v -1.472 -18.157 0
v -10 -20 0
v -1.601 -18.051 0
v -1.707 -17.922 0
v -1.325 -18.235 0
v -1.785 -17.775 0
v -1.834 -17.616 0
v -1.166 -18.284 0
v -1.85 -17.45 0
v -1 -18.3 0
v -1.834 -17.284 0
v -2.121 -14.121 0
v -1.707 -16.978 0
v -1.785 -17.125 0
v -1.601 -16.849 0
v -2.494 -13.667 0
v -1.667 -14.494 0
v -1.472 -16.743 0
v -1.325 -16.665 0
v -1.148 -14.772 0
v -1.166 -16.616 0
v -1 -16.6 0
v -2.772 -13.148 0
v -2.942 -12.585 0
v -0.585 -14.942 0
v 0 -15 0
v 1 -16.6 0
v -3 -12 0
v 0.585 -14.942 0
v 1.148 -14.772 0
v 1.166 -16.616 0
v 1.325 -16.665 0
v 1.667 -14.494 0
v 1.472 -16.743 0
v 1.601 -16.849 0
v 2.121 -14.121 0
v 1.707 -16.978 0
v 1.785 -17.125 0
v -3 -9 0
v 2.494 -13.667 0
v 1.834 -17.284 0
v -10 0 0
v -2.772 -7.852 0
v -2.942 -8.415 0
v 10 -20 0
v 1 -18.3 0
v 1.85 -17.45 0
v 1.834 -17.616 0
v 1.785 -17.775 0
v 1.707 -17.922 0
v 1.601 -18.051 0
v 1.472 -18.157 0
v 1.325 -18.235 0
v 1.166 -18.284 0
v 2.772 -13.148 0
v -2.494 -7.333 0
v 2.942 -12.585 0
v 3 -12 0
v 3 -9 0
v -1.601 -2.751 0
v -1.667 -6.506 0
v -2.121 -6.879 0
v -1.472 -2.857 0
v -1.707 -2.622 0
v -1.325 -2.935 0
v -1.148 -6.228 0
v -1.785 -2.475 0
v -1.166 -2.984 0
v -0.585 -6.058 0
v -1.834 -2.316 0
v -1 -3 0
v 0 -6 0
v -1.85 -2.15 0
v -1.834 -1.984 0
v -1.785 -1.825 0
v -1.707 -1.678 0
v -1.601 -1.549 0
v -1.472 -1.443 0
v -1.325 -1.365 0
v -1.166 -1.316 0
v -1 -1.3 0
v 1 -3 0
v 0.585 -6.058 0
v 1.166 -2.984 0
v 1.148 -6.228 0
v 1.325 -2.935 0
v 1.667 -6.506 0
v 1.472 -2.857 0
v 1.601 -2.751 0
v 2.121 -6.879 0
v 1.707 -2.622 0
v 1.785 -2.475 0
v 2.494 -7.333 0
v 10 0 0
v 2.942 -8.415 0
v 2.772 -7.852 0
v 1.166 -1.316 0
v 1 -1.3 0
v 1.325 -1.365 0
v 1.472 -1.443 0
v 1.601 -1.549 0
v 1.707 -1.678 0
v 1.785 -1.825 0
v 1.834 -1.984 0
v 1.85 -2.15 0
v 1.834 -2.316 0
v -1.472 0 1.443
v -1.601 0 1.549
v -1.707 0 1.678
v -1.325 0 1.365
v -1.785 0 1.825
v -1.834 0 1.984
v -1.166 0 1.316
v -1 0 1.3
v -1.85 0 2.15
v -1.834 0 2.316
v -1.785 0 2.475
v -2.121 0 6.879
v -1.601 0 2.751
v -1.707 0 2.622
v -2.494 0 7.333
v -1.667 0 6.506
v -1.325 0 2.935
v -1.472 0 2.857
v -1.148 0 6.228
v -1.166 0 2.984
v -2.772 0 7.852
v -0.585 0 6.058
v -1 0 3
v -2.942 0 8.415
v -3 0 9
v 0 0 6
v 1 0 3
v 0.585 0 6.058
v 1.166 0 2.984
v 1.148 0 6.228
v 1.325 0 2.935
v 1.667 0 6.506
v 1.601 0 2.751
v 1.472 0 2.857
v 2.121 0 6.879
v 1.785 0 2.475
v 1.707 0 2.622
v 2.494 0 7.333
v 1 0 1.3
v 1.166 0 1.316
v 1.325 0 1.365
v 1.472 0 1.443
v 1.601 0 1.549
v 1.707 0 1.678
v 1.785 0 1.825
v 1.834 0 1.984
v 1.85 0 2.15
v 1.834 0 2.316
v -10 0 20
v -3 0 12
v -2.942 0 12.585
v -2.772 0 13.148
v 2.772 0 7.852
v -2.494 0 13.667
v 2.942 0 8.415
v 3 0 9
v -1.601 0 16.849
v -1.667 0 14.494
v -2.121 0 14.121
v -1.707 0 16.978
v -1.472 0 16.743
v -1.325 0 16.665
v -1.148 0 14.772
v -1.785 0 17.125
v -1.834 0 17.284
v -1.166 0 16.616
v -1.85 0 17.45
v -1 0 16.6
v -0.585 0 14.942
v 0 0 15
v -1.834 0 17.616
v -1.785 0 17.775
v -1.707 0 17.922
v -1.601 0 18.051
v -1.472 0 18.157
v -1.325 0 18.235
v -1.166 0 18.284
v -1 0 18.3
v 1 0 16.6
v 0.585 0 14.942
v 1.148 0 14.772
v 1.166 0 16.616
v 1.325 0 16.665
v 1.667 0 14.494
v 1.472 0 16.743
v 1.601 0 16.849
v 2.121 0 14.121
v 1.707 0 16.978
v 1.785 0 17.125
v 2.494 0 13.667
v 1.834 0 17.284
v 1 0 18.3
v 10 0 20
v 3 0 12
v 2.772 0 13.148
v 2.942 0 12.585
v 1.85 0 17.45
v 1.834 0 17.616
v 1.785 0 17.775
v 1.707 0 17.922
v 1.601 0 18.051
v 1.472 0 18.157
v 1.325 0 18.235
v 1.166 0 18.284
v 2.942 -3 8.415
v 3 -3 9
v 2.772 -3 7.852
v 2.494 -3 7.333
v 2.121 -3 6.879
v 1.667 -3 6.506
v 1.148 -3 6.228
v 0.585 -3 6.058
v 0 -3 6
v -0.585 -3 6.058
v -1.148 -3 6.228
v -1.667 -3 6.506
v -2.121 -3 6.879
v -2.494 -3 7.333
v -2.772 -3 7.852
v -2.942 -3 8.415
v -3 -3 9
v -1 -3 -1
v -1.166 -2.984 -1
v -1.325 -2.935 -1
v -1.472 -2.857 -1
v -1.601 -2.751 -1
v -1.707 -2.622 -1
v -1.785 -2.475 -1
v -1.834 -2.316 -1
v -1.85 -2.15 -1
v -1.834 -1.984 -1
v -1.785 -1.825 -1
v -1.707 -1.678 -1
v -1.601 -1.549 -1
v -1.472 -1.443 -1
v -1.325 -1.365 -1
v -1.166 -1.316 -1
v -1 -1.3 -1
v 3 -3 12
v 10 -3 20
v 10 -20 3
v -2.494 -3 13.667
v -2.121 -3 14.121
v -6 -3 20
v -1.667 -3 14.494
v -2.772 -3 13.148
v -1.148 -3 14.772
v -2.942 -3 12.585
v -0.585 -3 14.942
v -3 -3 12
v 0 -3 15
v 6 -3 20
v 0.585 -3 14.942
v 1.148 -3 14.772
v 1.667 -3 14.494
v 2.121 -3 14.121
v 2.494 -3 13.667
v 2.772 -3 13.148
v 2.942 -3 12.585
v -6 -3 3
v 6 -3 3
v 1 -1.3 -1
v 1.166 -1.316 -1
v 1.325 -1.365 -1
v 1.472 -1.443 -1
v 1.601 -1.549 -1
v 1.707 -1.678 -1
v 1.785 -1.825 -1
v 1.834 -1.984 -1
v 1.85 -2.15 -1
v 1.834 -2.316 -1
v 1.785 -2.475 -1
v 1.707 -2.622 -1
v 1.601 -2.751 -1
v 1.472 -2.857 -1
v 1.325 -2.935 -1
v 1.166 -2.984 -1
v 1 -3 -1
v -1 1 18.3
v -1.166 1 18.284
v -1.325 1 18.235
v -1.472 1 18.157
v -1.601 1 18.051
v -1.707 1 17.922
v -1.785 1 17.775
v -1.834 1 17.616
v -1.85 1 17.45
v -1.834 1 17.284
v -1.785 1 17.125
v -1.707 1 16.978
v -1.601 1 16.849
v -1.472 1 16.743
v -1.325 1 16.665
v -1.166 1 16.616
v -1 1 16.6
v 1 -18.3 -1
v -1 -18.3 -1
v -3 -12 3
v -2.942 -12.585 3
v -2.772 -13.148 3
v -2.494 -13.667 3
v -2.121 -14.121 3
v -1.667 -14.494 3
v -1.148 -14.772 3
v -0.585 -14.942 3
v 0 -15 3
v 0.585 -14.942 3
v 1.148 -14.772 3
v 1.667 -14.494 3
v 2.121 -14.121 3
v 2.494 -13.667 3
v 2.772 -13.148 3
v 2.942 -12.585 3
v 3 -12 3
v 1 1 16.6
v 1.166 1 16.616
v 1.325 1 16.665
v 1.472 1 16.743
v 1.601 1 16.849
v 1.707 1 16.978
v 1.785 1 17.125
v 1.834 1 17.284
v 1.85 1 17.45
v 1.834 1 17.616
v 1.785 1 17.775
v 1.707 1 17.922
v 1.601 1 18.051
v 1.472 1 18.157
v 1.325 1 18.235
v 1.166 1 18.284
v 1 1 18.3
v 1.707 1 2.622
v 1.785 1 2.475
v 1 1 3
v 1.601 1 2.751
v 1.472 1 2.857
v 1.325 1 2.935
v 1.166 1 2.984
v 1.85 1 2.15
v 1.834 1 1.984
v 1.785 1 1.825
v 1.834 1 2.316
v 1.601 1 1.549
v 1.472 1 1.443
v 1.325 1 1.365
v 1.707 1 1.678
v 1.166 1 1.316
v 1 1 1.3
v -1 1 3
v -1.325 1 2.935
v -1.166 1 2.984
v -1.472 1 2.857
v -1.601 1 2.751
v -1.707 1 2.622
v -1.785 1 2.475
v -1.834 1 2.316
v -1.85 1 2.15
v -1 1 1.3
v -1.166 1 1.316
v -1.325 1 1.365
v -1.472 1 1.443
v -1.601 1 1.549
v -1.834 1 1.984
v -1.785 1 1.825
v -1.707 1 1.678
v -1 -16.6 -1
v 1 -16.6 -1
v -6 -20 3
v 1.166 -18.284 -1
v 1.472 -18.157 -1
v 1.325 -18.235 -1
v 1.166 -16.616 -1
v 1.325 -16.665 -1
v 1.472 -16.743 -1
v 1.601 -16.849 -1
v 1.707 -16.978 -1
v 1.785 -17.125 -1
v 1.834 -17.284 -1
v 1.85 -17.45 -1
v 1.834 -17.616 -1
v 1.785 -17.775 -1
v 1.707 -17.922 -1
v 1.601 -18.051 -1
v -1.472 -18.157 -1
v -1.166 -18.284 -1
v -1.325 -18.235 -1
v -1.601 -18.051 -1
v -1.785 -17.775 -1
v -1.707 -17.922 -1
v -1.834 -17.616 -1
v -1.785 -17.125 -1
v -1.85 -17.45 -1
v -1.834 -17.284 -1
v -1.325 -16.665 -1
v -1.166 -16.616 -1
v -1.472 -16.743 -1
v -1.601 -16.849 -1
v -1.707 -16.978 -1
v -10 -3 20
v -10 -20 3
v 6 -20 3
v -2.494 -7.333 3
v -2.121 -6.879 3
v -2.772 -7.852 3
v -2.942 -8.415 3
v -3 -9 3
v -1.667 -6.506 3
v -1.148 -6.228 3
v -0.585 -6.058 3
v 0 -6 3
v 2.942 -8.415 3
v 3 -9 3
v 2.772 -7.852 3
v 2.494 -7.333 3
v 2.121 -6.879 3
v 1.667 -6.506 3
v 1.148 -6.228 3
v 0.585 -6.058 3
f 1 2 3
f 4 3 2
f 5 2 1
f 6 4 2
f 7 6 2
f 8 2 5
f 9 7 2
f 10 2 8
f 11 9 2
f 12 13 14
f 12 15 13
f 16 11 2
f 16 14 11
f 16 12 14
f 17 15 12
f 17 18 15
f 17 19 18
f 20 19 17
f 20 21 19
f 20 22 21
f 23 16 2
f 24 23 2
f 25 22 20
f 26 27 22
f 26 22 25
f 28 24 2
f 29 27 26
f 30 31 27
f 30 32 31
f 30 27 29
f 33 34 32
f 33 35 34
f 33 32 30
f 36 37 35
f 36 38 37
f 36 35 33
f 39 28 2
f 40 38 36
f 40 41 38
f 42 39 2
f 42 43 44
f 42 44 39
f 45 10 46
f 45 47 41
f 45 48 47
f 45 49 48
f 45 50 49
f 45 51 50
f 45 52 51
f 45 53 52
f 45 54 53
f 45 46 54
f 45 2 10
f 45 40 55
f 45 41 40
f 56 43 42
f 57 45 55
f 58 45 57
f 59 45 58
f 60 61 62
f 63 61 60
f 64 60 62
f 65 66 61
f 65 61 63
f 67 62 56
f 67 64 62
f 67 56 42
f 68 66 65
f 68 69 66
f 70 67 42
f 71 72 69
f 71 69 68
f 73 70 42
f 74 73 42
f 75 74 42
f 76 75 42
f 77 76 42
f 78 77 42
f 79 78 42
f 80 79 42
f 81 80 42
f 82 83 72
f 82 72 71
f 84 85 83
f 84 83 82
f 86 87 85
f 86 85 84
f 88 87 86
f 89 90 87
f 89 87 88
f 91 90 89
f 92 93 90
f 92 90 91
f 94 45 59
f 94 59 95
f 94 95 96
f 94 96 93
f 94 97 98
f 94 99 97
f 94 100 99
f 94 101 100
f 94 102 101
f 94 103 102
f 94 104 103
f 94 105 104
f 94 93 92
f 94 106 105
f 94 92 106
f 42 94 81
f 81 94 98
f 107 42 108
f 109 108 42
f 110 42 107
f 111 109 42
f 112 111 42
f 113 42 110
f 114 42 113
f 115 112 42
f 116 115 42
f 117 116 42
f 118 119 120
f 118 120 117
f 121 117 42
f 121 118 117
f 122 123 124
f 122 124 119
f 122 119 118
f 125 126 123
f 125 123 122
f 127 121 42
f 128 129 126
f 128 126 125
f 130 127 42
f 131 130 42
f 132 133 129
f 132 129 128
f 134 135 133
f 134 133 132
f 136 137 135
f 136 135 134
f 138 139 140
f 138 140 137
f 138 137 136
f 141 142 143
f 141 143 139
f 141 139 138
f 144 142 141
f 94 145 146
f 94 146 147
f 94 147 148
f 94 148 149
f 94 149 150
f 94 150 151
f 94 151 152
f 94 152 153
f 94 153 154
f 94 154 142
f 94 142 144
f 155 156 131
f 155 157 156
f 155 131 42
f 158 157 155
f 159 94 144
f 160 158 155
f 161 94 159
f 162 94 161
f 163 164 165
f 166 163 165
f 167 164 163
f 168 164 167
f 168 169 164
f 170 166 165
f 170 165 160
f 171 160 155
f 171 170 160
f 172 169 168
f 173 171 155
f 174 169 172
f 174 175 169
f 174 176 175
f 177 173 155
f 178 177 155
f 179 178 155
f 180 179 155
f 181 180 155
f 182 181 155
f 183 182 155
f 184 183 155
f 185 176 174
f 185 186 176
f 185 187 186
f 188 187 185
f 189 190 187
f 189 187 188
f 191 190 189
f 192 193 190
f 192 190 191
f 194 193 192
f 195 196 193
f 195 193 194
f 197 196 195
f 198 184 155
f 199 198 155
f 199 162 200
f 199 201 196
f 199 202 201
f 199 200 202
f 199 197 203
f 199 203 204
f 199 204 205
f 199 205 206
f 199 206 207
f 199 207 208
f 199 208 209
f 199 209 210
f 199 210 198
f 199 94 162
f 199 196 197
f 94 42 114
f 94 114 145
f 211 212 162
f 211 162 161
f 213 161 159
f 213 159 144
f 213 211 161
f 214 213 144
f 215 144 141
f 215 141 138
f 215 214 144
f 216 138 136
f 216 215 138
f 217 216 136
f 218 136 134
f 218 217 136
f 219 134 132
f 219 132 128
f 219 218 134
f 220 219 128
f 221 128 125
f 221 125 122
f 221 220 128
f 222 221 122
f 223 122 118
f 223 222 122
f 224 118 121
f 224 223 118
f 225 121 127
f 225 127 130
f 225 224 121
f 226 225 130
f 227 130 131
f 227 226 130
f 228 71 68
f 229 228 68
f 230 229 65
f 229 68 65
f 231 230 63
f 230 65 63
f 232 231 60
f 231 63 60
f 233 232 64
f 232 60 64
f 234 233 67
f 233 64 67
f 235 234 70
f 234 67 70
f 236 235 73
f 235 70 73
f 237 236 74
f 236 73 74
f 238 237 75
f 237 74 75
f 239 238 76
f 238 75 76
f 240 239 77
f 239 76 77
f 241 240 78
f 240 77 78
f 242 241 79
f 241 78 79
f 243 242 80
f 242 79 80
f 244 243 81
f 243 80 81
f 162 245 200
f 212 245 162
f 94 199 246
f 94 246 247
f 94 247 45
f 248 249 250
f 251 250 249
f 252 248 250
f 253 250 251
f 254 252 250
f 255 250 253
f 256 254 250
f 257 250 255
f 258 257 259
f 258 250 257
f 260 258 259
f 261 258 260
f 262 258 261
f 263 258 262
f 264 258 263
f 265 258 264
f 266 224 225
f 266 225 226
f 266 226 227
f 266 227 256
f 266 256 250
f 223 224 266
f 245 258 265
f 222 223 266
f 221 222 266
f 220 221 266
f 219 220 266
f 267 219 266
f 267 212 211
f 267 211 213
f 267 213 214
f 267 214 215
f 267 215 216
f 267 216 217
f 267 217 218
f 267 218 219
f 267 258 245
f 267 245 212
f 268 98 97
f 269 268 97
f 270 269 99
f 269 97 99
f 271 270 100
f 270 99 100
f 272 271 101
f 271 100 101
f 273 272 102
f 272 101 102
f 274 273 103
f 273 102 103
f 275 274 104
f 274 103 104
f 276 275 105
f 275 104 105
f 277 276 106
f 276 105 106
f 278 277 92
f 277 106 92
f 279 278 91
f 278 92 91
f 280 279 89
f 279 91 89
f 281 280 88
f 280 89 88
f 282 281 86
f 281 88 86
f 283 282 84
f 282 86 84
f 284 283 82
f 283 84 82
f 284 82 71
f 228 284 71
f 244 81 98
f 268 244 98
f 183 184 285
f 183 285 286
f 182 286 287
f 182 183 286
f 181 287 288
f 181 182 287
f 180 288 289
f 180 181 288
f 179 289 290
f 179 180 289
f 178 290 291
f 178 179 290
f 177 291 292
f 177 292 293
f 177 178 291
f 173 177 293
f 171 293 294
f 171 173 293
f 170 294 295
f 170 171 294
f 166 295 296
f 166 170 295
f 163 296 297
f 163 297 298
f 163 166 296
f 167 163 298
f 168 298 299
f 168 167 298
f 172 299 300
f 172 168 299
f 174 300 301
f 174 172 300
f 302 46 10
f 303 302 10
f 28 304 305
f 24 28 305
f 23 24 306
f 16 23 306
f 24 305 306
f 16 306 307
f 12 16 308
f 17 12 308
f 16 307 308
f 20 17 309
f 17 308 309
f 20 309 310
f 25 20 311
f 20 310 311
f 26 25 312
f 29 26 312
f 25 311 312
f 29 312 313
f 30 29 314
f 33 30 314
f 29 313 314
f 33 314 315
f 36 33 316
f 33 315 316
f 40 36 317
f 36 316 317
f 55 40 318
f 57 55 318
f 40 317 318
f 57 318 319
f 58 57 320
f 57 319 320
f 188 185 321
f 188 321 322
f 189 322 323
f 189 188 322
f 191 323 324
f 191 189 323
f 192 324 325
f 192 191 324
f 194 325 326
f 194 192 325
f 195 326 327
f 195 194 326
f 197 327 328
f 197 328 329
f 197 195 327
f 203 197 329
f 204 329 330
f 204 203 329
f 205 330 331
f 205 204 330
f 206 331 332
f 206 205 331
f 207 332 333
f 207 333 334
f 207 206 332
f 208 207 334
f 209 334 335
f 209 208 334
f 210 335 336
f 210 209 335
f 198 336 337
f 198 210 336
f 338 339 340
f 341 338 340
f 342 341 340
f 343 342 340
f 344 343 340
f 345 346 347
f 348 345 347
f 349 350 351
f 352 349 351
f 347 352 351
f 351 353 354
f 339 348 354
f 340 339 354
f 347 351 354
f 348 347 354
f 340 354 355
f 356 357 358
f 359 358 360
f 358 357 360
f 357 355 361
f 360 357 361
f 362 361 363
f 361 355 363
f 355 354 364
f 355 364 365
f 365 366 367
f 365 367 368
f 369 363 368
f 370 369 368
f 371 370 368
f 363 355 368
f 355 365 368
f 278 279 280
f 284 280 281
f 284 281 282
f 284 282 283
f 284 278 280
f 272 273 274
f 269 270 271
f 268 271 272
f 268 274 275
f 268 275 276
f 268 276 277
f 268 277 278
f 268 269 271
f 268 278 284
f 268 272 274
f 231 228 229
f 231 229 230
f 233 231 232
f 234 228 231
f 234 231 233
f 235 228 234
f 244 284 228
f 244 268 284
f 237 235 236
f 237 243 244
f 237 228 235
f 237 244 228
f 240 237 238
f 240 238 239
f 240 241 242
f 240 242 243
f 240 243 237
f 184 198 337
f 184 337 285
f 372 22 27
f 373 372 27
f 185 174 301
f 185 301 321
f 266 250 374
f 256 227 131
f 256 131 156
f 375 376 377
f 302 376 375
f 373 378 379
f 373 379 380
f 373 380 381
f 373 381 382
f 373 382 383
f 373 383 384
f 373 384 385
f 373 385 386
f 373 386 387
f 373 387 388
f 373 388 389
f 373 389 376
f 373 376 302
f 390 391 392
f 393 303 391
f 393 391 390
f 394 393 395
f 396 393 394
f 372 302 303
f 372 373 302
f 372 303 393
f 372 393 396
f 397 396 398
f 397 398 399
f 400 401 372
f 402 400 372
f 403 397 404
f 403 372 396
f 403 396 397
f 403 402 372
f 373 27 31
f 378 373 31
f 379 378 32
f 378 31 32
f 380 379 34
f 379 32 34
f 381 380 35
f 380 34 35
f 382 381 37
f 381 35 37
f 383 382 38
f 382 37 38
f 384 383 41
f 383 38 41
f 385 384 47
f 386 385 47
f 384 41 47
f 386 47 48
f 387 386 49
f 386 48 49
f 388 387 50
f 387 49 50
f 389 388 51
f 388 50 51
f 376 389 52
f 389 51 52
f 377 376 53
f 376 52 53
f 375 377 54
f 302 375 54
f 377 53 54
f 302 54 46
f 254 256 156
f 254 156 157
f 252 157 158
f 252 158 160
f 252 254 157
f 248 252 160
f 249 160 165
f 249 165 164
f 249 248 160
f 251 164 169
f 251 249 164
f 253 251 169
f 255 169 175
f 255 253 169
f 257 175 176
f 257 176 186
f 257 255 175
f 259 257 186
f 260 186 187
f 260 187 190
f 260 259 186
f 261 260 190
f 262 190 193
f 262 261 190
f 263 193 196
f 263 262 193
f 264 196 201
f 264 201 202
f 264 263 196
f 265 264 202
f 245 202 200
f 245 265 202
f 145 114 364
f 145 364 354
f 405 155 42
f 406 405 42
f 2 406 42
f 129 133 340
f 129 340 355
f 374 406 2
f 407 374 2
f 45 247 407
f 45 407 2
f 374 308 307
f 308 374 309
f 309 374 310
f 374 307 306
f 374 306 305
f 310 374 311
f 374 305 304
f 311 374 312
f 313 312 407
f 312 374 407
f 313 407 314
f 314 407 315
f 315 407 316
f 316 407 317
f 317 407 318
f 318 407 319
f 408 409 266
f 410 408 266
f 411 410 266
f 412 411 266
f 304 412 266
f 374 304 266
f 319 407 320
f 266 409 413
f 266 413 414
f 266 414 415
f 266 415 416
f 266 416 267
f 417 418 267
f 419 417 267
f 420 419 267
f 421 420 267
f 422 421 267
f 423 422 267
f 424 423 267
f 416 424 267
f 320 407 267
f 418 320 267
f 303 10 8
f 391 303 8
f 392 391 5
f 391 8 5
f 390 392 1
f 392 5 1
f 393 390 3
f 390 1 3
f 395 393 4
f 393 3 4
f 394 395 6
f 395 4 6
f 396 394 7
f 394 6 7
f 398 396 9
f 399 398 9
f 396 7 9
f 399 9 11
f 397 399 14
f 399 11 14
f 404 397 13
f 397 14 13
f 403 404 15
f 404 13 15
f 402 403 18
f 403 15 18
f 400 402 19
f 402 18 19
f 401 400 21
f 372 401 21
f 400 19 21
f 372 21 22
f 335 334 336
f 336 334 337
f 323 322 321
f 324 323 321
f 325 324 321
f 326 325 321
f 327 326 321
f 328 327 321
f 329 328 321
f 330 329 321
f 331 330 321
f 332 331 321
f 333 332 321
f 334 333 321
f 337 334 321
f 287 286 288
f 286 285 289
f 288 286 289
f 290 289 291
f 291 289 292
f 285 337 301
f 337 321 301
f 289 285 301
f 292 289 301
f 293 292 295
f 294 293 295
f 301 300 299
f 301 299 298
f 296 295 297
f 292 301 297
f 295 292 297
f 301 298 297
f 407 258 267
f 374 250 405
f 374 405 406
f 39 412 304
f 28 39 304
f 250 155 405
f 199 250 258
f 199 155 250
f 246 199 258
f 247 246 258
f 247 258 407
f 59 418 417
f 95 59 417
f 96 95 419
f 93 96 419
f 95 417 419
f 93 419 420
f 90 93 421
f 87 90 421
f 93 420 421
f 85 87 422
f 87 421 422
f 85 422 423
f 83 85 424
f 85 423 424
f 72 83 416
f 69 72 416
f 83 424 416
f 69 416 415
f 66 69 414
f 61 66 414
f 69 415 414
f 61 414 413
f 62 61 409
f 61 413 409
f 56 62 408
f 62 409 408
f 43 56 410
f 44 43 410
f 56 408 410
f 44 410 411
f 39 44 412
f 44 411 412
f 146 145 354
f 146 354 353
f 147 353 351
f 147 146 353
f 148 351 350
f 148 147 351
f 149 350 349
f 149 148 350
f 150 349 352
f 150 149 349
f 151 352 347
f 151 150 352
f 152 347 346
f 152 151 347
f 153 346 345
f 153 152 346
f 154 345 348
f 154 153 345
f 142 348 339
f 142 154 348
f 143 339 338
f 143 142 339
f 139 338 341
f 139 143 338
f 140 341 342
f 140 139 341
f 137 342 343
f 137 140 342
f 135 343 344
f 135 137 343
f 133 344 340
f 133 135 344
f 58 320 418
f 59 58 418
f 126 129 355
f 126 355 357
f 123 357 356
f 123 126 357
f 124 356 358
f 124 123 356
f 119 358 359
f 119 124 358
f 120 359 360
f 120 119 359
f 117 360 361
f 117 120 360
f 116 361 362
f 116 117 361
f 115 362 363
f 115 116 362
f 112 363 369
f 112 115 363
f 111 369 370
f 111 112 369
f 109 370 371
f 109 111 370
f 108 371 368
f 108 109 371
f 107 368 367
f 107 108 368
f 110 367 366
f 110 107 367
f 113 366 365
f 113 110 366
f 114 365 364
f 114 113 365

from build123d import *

# Parameters (mm, degrees)
BOSS_EXTRUDE1_DEPTH = 10
SKETCH2_W           = 17
SKETCH2_H           = 17
CUT_EXTRUDE1_DEPTH  = 6
CUT_EXTRUDE2_DEPTH  = 3
BOSS_EXTRUDE2_DEPTH = 1


with BuildPart() as part:
    # Sketch1 → Boss-Extrude1 (new body, symmetric)
    with BuildSketch(Plane(origin=(0, 0, 0), x_dir=(0, 0, -1), z_dir=(1, 0, 0))):
        Polygon((0, 0), (-20, 0), (-20, -3), (-11.5, -11.5), (-3, -20), (0, -20), align=None)
    extrude(amount=BOSS_EXTRUDE1_DEPTH, both=True)

    # Sketch2 → Cut-Extrude1 (cut, symmetric)
    with BuildSketch(Plane(origin=(0, 0, 0), x_dir=(0, 0, -1), z_dir=(1, 0, 0))):
        with Locations((-11.5, -11.5)):
            Rectangle(SKETCH2_W, SKETCH2_H)
    extrude(amount=CUT_EXTRUDE1_DEPTH, both=True, mode=Mode.SUBTRACT)

    # Sketch3 → Cut-Extrude2 (cut)
    with BuildSketch(Plane.XY.offset(3)):
        with BuildLine():
            Line((-3, -9), (-3, -12))
            ThreePointArc((-3, -12), (0, -15), (3, -12))
            Line((3, -12), (3, -9))
            ThreePointArc((3, -9), (0, -6), (-3, -9))
        make_face()
    cut_extrude2 = extrude(amount=-CUT_EXTRUDE2_DEPTH, mode=Mode.SUBTRACT)

    # Sketch4 → Boss-Extrude2 (add)
    with BuildSketch(Plane(origin=(0, 0, 0), x_dir=(-1, 0, 0), z_dir=(0, 0, -1))):
        with BuildLine():
            Line((-1, -3), (1, -3))
            ThreePointArc((1, -3), (1.85, -2.15), (1, -1.3))
            Line((1, -1.3), (-1, -1.3))
            ThreePointArc((-1, -1.3), (-1.85, -2.15), (-1, -3))
        make_face()
        with BuildLine():
            Line((-1, -18.3), (1, -18.3))
            ThreePointArc((1, -18.3), (1.85, -17.45), (1, -16.6))
            Line((1, -16.6), (-1, -16.6))
            ThreePointArc((-1, -16.6), (-1.85, -17.45), (-1, -18.3))
        make_face()
    boss_extrude2 = extrude(amount=BOSS_EXTRUDE2_DEPTH)

    # Mirror1: Cut-Extrude2, Boss-Extrude2 across plane
    add(cut_extrude2.mirror(Plane(origin=(0, 0, 0), x_dir=(0, -0.707106781, 0.707106781), z_dir=(0, 0.707106781, 0.707106781))), mode=Mode.SUBTRACT)
    add(boss_extrude2.mirror(Plane(origin=(0, 0, 0), x_dir=(0, -0.707106781, 0.707106781), z_dir=(0, 0.707106781, 0.707106781))))


solid = part.part
